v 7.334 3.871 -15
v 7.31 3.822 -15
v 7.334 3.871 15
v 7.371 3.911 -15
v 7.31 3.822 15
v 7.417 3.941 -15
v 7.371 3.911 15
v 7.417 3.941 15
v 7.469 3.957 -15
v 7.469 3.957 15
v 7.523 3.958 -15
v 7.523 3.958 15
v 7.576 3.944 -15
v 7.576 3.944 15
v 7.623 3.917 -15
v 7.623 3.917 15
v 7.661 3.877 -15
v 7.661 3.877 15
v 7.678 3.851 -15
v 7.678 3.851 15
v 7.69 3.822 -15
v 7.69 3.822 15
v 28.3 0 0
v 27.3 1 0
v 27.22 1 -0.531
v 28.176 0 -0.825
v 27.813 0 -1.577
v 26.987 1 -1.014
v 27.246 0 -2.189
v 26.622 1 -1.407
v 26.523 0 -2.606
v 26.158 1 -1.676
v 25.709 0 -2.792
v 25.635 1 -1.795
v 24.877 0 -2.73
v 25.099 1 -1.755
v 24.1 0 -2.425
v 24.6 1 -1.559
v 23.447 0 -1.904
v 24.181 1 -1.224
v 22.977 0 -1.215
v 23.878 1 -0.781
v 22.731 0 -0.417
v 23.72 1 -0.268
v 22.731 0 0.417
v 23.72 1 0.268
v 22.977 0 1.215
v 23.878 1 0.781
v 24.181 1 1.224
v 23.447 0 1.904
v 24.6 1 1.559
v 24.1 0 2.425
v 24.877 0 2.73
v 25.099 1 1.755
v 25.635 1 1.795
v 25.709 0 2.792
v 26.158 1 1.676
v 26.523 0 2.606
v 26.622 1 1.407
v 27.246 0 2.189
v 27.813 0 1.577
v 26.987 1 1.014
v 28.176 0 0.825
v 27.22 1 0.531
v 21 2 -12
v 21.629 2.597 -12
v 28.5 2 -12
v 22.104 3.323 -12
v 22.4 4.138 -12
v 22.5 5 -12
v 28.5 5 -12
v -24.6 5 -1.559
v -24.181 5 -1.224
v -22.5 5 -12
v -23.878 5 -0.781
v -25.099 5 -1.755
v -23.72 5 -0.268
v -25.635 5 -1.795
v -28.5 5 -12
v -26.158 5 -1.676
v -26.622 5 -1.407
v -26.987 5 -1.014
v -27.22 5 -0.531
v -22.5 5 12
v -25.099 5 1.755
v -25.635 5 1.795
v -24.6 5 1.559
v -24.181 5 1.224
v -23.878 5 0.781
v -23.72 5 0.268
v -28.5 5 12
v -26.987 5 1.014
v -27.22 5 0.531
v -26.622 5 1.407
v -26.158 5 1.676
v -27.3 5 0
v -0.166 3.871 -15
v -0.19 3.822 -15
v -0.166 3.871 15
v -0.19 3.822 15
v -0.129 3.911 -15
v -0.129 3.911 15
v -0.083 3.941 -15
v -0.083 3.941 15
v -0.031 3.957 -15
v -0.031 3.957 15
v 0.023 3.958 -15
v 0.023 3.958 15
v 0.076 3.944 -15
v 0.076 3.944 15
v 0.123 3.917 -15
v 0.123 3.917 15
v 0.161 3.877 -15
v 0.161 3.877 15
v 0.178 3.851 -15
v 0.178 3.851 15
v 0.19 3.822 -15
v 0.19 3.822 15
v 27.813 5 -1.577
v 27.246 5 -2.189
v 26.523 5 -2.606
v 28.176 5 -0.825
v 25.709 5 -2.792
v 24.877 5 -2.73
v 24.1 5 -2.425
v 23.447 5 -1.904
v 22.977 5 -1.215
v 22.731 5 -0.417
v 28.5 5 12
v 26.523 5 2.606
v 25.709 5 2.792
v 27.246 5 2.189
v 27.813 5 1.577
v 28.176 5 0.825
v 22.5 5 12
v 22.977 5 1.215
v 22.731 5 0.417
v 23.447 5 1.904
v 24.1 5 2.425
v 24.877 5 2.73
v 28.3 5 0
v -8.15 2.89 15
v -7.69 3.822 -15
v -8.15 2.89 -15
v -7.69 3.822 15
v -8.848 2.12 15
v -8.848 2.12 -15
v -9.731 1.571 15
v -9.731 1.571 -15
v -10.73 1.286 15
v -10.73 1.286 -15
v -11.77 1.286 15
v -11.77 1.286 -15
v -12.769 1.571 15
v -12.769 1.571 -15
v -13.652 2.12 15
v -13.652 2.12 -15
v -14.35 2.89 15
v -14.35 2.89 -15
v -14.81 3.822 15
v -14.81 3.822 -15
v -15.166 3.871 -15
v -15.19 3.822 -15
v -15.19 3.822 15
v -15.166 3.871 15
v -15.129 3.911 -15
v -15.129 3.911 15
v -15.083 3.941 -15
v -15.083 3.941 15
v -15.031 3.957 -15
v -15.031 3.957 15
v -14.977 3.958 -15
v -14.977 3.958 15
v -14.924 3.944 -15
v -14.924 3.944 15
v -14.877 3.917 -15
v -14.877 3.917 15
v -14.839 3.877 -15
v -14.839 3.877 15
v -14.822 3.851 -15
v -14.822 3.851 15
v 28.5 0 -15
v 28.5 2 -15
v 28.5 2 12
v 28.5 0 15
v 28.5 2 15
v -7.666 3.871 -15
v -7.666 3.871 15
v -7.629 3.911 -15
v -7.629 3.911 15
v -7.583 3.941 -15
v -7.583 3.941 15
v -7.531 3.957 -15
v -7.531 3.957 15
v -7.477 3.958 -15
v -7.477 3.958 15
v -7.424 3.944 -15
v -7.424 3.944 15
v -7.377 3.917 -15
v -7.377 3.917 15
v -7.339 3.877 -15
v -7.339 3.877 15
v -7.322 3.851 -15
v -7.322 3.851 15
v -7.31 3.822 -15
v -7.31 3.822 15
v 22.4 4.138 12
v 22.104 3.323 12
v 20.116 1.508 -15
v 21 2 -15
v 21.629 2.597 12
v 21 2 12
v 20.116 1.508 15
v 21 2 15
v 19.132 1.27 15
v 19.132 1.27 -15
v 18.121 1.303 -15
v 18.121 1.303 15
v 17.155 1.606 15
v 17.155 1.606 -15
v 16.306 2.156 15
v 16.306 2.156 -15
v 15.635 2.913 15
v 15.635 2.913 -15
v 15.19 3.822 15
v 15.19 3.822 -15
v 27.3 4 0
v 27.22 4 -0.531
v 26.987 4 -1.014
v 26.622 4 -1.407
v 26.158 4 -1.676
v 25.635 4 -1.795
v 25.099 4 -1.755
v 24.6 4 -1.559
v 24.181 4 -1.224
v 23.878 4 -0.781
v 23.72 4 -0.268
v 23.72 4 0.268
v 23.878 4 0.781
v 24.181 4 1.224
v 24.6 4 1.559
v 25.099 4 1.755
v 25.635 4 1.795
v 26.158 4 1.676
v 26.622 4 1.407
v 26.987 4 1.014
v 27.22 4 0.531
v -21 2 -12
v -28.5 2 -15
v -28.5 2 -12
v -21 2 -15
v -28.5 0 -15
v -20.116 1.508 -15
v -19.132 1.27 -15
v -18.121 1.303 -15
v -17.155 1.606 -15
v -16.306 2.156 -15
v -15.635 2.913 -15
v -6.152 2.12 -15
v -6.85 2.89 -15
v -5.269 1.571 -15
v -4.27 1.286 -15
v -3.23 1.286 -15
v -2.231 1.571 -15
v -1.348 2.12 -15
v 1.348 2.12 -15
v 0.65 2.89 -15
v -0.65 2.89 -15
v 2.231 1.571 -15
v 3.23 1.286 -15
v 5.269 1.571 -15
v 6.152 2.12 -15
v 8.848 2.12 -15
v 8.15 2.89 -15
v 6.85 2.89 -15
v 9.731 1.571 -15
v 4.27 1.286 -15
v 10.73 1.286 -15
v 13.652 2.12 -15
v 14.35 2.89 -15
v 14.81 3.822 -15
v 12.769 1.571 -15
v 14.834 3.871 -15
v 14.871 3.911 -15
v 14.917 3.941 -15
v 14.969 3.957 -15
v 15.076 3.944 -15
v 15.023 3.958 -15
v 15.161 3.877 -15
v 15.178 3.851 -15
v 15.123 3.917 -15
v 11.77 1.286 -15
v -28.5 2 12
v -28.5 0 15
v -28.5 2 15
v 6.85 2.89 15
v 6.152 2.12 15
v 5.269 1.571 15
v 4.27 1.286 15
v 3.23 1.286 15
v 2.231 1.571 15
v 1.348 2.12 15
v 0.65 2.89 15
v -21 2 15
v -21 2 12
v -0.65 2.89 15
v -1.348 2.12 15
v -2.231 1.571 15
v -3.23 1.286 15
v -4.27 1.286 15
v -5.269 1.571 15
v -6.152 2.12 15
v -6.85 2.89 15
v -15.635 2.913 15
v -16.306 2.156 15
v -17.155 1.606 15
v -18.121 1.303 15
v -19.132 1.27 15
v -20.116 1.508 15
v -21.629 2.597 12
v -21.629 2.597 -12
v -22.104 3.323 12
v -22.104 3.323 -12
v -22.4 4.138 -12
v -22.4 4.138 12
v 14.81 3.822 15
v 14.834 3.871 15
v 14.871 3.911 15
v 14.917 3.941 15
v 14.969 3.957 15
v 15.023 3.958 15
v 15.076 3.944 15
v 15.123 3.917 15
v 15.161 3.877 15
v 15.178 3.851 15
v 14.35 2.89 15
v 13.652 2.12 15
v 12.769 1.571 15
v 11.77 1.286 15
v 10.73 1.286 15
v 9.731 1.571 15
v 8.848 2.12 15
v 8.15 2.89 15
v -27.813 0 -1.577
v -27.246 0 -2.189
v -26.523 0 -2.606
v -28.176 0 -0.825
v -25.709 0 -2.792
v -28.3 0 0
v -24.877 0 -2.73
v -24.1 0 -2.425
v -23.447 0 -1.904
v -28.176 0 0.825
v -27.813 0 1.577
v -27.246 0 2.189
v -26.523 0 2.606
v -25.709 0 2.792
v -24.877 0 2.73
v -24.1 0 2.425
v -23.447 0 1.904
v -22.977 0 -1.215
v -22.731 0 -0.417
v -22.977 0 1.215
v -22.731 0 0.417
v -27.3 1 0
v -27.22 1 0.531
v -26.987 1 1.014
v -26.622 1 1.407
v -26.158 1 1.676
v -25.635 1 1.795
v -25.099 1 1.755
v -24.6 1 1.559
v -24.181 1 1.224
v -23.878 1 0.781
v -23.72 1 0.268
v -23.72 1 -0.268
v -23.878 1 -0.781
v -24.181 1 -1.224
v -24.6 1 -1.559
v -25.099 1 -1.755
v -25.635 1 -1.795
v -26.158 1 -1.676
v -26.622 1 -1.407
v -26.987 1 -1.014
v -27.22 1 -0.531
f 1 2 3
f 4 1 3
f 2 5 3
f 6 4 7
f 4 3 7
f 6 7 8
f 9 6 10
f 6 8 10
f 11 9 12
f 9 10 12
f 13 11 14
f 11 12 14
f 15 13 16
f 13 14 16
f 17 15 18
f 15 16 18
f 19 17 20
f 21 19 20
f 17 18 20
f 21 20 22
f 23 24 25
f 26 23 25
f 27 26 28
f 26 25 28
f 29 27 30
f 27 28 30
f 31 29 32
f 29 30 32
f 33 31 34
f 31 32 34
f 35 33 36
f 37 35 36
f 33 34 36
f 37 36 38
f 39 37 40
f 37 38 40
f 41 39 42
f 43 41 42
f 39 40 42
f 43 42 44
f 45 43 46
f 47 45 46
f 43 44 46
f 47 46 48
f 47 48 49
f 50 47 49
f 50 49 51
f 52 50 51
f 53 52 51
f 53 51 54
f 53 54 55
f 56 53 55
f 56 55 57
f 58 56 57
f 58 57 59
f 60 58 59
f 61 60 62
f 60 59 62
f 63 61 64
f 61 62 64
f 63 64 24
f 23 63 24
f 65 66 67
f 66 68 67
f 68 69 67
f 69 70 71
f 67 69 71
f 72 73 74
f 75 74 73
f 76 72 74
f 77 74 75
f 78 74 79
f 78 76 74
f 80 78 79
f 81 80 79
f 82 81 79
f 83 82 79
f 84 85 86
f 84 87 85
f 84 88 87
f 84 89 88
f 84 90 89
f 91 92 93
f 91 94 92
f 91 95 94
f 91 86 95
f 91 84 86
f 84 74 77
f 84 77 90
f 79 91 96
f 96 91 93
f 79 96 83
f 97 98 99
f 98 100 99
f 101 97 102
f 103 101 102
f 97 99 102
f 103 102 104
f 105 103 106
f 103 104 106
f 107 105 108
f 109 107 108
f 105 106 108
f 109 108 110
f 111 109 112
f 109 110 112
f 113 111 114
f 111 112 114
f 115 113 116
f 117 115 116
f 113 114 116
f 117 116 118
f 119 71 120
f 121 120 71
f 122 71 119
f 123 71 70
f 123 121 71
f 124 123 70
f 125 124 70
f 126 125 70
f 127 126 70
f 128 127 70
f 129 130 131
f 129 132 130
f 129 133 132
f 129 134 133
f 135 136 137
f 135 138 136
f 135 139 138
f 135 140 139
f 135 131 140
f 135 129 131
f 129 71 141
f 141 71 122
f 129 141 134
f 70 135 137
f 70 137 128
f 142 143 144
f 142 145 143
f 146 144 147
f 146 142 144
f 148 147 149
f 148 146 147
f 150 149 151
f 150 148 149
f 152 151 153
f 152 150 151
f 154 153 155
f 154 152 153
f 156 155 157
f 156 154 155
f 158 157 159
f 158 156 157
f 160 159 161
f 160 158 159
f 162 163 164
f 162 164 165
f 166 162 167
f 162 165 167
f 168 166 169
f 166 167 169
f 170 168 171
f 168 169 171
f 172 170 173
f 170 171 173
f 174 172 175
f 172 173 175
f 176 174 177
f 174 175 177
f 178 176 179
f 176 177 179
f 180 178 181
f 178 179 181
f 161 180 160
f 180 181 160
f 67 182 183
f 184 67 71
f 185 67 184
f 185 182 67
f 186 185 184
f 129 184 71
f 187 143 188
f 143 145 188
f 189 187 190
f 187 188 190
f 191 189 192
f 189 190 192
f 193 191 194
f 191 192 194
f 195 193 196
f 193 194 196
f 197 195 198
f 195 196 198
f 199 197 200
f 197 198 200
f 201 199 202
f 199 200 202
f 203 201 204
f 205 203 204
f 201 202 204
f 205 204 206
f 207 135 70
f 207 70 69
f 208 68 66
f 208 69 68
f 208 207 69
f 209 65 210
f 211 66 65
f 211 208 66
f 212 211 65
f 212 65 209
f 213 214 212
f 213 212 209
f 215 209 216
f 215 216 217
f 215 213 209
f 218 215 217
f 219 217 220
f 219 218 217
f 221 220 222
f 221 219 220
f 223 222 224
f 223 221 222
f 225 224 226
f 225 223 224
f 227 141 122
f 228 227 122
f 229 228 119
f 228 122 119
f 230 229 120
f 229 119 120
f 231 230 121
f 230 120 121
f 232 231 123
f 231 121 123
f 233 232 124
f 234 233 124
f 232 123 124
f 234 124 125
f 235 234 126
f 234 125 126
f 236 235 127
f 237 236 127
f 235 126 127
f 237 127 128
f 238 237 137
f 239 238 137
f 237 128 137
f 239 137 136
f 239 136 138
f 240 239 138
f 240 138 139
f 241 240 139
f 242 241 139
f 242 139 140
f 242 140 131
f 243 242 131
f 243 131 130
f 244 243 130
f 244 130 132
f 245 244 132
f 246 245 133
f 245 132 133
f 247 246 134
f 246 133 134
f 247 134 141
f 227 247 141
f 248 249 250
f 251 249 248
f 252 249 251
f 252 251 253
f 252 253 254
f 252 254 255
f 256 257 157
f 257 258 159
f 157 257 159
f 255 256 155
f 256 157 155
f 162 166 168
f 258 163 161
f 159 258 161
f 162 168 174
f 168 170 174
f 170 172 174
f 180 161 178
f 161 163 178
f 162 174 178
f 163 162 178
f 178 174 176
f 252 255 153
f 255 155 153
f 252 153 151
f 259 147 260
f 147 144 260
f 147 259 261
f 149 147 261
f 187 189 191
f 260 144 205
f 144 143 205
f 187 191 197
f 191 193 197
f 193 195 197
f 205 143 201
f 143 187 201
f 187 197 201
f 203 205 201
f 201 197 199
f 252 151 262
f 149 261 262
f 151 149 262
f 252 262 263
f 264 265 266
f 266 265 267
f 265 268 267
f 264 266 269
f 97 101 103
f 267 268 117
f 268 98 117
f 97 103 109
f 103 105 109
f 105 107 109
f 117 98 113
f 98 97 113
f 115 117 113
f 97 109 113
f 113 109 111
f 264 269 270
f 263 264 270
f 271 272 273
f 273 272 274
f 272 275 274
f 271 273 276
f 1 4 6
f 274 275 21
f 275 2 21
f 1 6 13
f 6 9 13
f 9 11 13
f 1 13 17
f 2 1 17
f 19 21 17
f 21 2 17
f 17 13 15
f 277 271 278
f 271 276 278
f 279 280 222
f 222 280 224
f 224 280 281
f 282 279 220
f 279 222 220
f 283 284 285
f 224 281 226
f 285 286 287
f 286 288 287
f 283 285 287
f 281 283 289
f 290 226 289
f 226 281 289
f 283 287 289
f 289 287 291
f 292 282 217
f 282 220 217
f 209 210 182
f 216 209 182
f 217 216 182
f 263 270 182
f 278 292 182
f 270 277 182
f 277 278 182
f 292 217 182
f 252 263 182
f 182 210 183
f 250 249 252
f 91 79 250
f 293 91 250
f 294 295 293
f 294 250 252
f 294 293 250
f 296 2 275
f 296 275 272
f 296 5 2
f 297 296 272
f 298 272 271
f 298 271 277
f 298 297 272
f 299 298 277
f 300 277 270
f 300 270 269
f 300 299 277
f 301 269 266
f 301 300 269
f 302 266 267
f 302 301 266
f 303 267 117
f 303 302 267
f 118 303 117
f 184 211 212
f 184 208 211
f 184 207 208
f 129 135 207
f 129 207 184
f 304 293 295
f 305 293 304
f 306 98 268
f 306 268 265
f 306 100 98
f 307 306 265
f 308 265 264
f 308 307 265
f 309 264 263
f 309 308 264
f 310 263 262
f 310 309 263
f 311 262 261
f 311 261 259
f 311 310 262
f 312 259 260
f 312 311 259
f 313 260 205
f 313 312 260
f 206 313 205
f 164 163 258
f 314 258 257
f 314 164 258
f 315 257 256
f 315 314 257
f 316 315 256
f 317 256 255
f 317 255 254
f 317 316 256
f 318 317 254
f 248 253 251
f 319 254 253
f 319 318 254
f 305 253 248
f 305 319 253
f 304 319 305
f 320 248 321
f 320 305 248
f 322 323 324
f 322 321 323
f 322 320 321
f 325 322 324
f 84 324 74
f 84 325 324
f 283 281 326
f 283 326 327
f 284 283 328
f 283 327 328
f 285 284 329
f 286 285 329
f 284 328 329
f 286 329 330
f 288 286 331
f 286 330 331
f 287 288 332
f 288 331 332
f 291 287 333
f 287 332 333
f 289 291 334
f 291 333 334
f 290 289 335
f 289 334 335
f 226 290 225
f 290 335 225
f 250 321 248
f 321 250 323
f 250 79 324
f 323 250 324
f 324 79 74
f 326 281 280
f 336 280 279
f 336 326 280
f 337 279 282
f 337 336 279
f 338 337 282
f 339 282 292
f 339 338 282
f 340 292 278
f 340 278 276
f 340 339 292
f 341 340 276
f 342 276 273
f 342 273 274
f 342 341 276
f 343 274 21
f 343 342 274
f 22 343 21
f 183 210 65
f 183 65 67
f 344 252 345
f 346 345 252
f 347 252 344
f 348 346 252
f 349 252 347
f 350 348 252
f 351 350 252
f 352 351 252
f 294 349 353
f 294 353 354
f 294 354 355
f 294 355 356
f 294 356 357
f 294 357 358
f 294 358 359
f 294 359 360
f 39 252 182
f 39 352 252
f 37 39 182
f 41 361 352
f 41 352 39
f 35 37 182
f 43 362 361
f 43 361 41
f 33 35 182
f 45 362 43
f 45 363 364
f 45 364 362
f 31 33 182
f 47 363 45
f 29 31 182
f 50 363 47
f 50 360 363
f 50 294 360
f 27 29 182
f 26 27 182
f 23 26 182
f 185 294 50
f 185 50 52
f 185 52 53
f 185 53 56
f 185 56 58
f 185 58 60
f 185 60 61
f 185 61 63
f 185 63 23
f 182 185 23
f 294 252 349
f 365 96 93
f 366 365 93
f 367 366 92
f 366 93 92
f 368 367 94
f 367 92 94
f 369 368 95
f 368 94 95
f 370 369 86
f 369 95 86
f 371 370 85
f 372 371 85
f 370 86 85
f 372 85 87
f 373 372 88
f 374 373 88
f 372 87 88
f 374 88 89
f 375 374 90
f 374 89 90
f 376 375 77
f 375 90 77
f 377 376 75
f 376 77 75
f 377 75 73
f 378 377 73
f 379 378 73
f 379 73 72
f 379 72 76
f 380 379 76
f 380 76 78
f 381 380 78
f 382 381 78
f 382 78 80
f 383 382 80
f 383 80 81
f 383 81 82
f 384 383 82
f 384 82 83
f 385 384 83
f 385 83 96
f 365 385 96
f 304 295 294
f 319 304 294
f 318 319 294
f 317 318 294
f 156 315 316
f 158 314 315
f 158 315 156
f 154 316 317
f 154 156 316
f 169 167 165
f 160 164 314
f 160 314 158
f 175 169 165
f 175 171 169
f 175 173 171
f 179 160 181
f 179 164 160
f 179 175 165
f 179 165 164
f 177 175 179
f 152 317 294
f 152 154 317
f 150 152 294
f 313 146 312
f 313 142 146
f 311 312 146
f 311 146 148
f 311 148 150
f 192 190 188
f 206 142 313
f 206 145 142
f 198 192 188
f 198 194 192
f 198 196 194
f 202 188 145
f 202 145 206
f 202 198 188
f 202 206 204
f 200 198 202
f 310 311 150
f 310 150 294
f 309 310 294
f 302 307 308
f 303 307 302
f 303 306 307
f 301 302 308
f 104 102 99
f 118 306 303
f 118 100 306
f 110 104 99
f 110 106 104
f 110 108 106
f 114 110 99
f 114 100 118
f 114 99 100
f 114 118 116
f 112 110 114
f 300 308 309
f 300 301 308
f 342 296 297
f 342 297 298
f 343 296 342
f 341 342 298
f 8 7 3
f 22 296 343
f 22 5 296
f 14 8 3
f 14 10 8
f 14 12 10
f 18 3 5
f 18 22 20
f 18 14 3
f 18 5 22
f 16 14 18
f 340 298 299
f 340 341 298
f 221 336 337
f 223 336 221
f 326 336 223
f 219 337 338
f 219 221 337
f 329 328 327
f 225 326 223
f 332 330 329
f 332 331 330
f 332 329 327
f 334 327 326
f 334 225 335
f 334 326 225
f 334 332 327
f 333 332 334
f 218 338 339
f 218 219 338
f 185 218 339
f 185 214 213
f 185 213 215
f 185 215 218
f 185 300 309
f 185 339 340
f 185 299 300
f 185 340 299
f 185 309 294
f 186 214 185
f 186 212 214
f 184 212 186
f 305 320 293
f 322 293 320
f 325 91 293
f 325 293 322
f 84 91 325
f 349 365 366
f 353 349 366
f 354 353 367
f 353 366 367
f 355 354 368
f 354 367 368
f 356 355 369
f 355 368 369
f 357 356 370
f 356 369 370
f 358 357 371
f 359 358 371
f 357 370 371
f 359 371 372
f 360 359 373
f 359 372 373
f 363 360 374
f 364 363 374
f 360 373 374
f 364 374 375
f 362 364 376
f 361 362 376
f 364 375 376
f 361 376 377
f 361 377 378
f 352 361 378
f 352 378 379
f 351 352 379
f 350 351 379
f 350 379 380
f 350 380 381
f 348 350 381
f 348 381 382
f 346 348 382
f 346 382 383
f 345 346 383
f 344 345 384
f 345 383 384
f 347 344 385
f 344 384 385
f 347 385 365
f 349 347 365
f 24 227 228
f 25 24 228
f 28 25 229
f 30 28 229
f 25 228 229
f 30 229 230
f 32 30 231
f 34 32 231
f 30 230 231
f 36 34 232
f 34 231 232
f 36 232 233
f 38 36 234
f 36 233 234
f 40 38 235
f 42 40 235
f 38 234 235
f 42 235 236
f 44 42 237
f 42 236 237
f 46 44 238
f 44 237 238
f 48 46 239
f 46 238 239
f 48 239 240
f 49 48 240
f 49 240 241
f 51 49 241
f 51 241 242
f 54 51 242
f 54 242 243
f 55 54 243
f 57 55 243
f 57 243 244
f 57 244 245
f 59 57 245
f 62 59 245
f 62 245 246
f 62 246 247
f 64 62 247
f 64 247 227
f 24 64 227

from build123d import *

# Parameters (mm, degrees)
RESSALTO_EXTRUS_O1_DEPTH = 15
ESBO_O2_R                = 1.8
CORTE_EXTRUS_O1_DEPTH    = 33.592176975
ESBO_O3_W                = 9.75
ESBO_O3_H                = 3
CORTE_EXTRUS_O2_DEPTH    = 3
FILETE1_R                = 0.2
CHANFRO1_SIZE            = 1


with BuildPart() as part:
    # Esboço1 → Ressalto-extrusão1 (new, symmetric)
    with BuildSketch(Plane.XY):
        with BuildLine():
            Line((-22.5, 0), (22.5, 0))
            Line((22.5, 0), (28.5, 0))
            Line((28.5, 0), (28.5, 5))
            Line((28.5, 5), (22.5, 5))
            ThreePointArc((22.5, 5), (18.75, 1.25), (15, 5))
            ThreePointArc((15, 5), (11.25, 1.25), (7.5, 5))
            ThreePointArc((7.5, 5), (3.75, 1.25), (0, 5))
            ThreePointArc((0, 5), (-3.75, 1.25), (-7.5, 5))
            ThreePointArc((-7.5, 5), (-11.25, 1.25), (-15, 5))
            ThreePointArc((-15, 5), (-18.75, 1.25), (-22.5, 5))
            Line((-22.5, 5), (-28.5, 5))
            Line((-28.5, 5), (-28.5, 0))
            Line((-28.5, 0), (-22.5, 0))
        make_face()
    extrude(amount=RESSALTO_EXTRUS_O1_DEPTH, both=True)

    # Esboço2 → Corte-extrusão1 (cut, through all)
    with BuildSketch(Plane(origin=(0, 5, 0), x_dir=(1, 0, 0), z_dir=(0, 1, 0))):
        with Locations(Location((-25.5, 0, 0), (0, 0, 180))):
            Circle(ESBO_O2_R)
        with Locations((25.5, 0)):
            Circle(ESBO_O2_R)
    extrude(amount=-CORTE_EXTRUS_O1_DEPTH, mode=Mode.SUBTRACT)

    # Esboço3 → Corte-extrusão2 (cut)
    with BuildSketch(Plane(origin=(0, 5, 0), x_dir=(1, 0, 0), z_dir=(0, 1, 0))):
        with Locations((-23.625, 13.5)):
            Rectangle(ESBO_O3_W, ESBO_O3_H)
        with Locations((-23.625, -13.5)):
            Rectangle(ESBO_O3_W, ESBO_O3_H)
        with Locations((23.625, -13.5)):
            Rectangle(ESBO_O3_W, ESBO_O3_H)
        with Locations((23.625, 13.5)):
            Rectangle(ESBO_O3_W, ESBO_O3_H)
    extrude(amount=-CORTE_EXTRUS_O2_DEPTH, mode=Mode.SUBTRACT)

    # Filete1
    filete1_edges = [part.edges().sort_by_distance(p)[0] for p in [
        (-15, 5, 0),
        (-7.5, 5, 0),
        (0, 5, 0),
        (7.5, 5, 0),
        (15, 5, 0),
    ]]
    fillet(filete1_edges, radius=FILETE1_R)

    # Chanfro1
    chanfro1_edges = [part.edges().sort_by_distance(p)[0] for p in [
        (-23.7, 0, 0),
        (23.7, 0, 0),
        (23.7, 5, 0),
    ]]
    chamfer(chanfro1_edges, length=CHANFRO1_SIZE)


solid = part.part
